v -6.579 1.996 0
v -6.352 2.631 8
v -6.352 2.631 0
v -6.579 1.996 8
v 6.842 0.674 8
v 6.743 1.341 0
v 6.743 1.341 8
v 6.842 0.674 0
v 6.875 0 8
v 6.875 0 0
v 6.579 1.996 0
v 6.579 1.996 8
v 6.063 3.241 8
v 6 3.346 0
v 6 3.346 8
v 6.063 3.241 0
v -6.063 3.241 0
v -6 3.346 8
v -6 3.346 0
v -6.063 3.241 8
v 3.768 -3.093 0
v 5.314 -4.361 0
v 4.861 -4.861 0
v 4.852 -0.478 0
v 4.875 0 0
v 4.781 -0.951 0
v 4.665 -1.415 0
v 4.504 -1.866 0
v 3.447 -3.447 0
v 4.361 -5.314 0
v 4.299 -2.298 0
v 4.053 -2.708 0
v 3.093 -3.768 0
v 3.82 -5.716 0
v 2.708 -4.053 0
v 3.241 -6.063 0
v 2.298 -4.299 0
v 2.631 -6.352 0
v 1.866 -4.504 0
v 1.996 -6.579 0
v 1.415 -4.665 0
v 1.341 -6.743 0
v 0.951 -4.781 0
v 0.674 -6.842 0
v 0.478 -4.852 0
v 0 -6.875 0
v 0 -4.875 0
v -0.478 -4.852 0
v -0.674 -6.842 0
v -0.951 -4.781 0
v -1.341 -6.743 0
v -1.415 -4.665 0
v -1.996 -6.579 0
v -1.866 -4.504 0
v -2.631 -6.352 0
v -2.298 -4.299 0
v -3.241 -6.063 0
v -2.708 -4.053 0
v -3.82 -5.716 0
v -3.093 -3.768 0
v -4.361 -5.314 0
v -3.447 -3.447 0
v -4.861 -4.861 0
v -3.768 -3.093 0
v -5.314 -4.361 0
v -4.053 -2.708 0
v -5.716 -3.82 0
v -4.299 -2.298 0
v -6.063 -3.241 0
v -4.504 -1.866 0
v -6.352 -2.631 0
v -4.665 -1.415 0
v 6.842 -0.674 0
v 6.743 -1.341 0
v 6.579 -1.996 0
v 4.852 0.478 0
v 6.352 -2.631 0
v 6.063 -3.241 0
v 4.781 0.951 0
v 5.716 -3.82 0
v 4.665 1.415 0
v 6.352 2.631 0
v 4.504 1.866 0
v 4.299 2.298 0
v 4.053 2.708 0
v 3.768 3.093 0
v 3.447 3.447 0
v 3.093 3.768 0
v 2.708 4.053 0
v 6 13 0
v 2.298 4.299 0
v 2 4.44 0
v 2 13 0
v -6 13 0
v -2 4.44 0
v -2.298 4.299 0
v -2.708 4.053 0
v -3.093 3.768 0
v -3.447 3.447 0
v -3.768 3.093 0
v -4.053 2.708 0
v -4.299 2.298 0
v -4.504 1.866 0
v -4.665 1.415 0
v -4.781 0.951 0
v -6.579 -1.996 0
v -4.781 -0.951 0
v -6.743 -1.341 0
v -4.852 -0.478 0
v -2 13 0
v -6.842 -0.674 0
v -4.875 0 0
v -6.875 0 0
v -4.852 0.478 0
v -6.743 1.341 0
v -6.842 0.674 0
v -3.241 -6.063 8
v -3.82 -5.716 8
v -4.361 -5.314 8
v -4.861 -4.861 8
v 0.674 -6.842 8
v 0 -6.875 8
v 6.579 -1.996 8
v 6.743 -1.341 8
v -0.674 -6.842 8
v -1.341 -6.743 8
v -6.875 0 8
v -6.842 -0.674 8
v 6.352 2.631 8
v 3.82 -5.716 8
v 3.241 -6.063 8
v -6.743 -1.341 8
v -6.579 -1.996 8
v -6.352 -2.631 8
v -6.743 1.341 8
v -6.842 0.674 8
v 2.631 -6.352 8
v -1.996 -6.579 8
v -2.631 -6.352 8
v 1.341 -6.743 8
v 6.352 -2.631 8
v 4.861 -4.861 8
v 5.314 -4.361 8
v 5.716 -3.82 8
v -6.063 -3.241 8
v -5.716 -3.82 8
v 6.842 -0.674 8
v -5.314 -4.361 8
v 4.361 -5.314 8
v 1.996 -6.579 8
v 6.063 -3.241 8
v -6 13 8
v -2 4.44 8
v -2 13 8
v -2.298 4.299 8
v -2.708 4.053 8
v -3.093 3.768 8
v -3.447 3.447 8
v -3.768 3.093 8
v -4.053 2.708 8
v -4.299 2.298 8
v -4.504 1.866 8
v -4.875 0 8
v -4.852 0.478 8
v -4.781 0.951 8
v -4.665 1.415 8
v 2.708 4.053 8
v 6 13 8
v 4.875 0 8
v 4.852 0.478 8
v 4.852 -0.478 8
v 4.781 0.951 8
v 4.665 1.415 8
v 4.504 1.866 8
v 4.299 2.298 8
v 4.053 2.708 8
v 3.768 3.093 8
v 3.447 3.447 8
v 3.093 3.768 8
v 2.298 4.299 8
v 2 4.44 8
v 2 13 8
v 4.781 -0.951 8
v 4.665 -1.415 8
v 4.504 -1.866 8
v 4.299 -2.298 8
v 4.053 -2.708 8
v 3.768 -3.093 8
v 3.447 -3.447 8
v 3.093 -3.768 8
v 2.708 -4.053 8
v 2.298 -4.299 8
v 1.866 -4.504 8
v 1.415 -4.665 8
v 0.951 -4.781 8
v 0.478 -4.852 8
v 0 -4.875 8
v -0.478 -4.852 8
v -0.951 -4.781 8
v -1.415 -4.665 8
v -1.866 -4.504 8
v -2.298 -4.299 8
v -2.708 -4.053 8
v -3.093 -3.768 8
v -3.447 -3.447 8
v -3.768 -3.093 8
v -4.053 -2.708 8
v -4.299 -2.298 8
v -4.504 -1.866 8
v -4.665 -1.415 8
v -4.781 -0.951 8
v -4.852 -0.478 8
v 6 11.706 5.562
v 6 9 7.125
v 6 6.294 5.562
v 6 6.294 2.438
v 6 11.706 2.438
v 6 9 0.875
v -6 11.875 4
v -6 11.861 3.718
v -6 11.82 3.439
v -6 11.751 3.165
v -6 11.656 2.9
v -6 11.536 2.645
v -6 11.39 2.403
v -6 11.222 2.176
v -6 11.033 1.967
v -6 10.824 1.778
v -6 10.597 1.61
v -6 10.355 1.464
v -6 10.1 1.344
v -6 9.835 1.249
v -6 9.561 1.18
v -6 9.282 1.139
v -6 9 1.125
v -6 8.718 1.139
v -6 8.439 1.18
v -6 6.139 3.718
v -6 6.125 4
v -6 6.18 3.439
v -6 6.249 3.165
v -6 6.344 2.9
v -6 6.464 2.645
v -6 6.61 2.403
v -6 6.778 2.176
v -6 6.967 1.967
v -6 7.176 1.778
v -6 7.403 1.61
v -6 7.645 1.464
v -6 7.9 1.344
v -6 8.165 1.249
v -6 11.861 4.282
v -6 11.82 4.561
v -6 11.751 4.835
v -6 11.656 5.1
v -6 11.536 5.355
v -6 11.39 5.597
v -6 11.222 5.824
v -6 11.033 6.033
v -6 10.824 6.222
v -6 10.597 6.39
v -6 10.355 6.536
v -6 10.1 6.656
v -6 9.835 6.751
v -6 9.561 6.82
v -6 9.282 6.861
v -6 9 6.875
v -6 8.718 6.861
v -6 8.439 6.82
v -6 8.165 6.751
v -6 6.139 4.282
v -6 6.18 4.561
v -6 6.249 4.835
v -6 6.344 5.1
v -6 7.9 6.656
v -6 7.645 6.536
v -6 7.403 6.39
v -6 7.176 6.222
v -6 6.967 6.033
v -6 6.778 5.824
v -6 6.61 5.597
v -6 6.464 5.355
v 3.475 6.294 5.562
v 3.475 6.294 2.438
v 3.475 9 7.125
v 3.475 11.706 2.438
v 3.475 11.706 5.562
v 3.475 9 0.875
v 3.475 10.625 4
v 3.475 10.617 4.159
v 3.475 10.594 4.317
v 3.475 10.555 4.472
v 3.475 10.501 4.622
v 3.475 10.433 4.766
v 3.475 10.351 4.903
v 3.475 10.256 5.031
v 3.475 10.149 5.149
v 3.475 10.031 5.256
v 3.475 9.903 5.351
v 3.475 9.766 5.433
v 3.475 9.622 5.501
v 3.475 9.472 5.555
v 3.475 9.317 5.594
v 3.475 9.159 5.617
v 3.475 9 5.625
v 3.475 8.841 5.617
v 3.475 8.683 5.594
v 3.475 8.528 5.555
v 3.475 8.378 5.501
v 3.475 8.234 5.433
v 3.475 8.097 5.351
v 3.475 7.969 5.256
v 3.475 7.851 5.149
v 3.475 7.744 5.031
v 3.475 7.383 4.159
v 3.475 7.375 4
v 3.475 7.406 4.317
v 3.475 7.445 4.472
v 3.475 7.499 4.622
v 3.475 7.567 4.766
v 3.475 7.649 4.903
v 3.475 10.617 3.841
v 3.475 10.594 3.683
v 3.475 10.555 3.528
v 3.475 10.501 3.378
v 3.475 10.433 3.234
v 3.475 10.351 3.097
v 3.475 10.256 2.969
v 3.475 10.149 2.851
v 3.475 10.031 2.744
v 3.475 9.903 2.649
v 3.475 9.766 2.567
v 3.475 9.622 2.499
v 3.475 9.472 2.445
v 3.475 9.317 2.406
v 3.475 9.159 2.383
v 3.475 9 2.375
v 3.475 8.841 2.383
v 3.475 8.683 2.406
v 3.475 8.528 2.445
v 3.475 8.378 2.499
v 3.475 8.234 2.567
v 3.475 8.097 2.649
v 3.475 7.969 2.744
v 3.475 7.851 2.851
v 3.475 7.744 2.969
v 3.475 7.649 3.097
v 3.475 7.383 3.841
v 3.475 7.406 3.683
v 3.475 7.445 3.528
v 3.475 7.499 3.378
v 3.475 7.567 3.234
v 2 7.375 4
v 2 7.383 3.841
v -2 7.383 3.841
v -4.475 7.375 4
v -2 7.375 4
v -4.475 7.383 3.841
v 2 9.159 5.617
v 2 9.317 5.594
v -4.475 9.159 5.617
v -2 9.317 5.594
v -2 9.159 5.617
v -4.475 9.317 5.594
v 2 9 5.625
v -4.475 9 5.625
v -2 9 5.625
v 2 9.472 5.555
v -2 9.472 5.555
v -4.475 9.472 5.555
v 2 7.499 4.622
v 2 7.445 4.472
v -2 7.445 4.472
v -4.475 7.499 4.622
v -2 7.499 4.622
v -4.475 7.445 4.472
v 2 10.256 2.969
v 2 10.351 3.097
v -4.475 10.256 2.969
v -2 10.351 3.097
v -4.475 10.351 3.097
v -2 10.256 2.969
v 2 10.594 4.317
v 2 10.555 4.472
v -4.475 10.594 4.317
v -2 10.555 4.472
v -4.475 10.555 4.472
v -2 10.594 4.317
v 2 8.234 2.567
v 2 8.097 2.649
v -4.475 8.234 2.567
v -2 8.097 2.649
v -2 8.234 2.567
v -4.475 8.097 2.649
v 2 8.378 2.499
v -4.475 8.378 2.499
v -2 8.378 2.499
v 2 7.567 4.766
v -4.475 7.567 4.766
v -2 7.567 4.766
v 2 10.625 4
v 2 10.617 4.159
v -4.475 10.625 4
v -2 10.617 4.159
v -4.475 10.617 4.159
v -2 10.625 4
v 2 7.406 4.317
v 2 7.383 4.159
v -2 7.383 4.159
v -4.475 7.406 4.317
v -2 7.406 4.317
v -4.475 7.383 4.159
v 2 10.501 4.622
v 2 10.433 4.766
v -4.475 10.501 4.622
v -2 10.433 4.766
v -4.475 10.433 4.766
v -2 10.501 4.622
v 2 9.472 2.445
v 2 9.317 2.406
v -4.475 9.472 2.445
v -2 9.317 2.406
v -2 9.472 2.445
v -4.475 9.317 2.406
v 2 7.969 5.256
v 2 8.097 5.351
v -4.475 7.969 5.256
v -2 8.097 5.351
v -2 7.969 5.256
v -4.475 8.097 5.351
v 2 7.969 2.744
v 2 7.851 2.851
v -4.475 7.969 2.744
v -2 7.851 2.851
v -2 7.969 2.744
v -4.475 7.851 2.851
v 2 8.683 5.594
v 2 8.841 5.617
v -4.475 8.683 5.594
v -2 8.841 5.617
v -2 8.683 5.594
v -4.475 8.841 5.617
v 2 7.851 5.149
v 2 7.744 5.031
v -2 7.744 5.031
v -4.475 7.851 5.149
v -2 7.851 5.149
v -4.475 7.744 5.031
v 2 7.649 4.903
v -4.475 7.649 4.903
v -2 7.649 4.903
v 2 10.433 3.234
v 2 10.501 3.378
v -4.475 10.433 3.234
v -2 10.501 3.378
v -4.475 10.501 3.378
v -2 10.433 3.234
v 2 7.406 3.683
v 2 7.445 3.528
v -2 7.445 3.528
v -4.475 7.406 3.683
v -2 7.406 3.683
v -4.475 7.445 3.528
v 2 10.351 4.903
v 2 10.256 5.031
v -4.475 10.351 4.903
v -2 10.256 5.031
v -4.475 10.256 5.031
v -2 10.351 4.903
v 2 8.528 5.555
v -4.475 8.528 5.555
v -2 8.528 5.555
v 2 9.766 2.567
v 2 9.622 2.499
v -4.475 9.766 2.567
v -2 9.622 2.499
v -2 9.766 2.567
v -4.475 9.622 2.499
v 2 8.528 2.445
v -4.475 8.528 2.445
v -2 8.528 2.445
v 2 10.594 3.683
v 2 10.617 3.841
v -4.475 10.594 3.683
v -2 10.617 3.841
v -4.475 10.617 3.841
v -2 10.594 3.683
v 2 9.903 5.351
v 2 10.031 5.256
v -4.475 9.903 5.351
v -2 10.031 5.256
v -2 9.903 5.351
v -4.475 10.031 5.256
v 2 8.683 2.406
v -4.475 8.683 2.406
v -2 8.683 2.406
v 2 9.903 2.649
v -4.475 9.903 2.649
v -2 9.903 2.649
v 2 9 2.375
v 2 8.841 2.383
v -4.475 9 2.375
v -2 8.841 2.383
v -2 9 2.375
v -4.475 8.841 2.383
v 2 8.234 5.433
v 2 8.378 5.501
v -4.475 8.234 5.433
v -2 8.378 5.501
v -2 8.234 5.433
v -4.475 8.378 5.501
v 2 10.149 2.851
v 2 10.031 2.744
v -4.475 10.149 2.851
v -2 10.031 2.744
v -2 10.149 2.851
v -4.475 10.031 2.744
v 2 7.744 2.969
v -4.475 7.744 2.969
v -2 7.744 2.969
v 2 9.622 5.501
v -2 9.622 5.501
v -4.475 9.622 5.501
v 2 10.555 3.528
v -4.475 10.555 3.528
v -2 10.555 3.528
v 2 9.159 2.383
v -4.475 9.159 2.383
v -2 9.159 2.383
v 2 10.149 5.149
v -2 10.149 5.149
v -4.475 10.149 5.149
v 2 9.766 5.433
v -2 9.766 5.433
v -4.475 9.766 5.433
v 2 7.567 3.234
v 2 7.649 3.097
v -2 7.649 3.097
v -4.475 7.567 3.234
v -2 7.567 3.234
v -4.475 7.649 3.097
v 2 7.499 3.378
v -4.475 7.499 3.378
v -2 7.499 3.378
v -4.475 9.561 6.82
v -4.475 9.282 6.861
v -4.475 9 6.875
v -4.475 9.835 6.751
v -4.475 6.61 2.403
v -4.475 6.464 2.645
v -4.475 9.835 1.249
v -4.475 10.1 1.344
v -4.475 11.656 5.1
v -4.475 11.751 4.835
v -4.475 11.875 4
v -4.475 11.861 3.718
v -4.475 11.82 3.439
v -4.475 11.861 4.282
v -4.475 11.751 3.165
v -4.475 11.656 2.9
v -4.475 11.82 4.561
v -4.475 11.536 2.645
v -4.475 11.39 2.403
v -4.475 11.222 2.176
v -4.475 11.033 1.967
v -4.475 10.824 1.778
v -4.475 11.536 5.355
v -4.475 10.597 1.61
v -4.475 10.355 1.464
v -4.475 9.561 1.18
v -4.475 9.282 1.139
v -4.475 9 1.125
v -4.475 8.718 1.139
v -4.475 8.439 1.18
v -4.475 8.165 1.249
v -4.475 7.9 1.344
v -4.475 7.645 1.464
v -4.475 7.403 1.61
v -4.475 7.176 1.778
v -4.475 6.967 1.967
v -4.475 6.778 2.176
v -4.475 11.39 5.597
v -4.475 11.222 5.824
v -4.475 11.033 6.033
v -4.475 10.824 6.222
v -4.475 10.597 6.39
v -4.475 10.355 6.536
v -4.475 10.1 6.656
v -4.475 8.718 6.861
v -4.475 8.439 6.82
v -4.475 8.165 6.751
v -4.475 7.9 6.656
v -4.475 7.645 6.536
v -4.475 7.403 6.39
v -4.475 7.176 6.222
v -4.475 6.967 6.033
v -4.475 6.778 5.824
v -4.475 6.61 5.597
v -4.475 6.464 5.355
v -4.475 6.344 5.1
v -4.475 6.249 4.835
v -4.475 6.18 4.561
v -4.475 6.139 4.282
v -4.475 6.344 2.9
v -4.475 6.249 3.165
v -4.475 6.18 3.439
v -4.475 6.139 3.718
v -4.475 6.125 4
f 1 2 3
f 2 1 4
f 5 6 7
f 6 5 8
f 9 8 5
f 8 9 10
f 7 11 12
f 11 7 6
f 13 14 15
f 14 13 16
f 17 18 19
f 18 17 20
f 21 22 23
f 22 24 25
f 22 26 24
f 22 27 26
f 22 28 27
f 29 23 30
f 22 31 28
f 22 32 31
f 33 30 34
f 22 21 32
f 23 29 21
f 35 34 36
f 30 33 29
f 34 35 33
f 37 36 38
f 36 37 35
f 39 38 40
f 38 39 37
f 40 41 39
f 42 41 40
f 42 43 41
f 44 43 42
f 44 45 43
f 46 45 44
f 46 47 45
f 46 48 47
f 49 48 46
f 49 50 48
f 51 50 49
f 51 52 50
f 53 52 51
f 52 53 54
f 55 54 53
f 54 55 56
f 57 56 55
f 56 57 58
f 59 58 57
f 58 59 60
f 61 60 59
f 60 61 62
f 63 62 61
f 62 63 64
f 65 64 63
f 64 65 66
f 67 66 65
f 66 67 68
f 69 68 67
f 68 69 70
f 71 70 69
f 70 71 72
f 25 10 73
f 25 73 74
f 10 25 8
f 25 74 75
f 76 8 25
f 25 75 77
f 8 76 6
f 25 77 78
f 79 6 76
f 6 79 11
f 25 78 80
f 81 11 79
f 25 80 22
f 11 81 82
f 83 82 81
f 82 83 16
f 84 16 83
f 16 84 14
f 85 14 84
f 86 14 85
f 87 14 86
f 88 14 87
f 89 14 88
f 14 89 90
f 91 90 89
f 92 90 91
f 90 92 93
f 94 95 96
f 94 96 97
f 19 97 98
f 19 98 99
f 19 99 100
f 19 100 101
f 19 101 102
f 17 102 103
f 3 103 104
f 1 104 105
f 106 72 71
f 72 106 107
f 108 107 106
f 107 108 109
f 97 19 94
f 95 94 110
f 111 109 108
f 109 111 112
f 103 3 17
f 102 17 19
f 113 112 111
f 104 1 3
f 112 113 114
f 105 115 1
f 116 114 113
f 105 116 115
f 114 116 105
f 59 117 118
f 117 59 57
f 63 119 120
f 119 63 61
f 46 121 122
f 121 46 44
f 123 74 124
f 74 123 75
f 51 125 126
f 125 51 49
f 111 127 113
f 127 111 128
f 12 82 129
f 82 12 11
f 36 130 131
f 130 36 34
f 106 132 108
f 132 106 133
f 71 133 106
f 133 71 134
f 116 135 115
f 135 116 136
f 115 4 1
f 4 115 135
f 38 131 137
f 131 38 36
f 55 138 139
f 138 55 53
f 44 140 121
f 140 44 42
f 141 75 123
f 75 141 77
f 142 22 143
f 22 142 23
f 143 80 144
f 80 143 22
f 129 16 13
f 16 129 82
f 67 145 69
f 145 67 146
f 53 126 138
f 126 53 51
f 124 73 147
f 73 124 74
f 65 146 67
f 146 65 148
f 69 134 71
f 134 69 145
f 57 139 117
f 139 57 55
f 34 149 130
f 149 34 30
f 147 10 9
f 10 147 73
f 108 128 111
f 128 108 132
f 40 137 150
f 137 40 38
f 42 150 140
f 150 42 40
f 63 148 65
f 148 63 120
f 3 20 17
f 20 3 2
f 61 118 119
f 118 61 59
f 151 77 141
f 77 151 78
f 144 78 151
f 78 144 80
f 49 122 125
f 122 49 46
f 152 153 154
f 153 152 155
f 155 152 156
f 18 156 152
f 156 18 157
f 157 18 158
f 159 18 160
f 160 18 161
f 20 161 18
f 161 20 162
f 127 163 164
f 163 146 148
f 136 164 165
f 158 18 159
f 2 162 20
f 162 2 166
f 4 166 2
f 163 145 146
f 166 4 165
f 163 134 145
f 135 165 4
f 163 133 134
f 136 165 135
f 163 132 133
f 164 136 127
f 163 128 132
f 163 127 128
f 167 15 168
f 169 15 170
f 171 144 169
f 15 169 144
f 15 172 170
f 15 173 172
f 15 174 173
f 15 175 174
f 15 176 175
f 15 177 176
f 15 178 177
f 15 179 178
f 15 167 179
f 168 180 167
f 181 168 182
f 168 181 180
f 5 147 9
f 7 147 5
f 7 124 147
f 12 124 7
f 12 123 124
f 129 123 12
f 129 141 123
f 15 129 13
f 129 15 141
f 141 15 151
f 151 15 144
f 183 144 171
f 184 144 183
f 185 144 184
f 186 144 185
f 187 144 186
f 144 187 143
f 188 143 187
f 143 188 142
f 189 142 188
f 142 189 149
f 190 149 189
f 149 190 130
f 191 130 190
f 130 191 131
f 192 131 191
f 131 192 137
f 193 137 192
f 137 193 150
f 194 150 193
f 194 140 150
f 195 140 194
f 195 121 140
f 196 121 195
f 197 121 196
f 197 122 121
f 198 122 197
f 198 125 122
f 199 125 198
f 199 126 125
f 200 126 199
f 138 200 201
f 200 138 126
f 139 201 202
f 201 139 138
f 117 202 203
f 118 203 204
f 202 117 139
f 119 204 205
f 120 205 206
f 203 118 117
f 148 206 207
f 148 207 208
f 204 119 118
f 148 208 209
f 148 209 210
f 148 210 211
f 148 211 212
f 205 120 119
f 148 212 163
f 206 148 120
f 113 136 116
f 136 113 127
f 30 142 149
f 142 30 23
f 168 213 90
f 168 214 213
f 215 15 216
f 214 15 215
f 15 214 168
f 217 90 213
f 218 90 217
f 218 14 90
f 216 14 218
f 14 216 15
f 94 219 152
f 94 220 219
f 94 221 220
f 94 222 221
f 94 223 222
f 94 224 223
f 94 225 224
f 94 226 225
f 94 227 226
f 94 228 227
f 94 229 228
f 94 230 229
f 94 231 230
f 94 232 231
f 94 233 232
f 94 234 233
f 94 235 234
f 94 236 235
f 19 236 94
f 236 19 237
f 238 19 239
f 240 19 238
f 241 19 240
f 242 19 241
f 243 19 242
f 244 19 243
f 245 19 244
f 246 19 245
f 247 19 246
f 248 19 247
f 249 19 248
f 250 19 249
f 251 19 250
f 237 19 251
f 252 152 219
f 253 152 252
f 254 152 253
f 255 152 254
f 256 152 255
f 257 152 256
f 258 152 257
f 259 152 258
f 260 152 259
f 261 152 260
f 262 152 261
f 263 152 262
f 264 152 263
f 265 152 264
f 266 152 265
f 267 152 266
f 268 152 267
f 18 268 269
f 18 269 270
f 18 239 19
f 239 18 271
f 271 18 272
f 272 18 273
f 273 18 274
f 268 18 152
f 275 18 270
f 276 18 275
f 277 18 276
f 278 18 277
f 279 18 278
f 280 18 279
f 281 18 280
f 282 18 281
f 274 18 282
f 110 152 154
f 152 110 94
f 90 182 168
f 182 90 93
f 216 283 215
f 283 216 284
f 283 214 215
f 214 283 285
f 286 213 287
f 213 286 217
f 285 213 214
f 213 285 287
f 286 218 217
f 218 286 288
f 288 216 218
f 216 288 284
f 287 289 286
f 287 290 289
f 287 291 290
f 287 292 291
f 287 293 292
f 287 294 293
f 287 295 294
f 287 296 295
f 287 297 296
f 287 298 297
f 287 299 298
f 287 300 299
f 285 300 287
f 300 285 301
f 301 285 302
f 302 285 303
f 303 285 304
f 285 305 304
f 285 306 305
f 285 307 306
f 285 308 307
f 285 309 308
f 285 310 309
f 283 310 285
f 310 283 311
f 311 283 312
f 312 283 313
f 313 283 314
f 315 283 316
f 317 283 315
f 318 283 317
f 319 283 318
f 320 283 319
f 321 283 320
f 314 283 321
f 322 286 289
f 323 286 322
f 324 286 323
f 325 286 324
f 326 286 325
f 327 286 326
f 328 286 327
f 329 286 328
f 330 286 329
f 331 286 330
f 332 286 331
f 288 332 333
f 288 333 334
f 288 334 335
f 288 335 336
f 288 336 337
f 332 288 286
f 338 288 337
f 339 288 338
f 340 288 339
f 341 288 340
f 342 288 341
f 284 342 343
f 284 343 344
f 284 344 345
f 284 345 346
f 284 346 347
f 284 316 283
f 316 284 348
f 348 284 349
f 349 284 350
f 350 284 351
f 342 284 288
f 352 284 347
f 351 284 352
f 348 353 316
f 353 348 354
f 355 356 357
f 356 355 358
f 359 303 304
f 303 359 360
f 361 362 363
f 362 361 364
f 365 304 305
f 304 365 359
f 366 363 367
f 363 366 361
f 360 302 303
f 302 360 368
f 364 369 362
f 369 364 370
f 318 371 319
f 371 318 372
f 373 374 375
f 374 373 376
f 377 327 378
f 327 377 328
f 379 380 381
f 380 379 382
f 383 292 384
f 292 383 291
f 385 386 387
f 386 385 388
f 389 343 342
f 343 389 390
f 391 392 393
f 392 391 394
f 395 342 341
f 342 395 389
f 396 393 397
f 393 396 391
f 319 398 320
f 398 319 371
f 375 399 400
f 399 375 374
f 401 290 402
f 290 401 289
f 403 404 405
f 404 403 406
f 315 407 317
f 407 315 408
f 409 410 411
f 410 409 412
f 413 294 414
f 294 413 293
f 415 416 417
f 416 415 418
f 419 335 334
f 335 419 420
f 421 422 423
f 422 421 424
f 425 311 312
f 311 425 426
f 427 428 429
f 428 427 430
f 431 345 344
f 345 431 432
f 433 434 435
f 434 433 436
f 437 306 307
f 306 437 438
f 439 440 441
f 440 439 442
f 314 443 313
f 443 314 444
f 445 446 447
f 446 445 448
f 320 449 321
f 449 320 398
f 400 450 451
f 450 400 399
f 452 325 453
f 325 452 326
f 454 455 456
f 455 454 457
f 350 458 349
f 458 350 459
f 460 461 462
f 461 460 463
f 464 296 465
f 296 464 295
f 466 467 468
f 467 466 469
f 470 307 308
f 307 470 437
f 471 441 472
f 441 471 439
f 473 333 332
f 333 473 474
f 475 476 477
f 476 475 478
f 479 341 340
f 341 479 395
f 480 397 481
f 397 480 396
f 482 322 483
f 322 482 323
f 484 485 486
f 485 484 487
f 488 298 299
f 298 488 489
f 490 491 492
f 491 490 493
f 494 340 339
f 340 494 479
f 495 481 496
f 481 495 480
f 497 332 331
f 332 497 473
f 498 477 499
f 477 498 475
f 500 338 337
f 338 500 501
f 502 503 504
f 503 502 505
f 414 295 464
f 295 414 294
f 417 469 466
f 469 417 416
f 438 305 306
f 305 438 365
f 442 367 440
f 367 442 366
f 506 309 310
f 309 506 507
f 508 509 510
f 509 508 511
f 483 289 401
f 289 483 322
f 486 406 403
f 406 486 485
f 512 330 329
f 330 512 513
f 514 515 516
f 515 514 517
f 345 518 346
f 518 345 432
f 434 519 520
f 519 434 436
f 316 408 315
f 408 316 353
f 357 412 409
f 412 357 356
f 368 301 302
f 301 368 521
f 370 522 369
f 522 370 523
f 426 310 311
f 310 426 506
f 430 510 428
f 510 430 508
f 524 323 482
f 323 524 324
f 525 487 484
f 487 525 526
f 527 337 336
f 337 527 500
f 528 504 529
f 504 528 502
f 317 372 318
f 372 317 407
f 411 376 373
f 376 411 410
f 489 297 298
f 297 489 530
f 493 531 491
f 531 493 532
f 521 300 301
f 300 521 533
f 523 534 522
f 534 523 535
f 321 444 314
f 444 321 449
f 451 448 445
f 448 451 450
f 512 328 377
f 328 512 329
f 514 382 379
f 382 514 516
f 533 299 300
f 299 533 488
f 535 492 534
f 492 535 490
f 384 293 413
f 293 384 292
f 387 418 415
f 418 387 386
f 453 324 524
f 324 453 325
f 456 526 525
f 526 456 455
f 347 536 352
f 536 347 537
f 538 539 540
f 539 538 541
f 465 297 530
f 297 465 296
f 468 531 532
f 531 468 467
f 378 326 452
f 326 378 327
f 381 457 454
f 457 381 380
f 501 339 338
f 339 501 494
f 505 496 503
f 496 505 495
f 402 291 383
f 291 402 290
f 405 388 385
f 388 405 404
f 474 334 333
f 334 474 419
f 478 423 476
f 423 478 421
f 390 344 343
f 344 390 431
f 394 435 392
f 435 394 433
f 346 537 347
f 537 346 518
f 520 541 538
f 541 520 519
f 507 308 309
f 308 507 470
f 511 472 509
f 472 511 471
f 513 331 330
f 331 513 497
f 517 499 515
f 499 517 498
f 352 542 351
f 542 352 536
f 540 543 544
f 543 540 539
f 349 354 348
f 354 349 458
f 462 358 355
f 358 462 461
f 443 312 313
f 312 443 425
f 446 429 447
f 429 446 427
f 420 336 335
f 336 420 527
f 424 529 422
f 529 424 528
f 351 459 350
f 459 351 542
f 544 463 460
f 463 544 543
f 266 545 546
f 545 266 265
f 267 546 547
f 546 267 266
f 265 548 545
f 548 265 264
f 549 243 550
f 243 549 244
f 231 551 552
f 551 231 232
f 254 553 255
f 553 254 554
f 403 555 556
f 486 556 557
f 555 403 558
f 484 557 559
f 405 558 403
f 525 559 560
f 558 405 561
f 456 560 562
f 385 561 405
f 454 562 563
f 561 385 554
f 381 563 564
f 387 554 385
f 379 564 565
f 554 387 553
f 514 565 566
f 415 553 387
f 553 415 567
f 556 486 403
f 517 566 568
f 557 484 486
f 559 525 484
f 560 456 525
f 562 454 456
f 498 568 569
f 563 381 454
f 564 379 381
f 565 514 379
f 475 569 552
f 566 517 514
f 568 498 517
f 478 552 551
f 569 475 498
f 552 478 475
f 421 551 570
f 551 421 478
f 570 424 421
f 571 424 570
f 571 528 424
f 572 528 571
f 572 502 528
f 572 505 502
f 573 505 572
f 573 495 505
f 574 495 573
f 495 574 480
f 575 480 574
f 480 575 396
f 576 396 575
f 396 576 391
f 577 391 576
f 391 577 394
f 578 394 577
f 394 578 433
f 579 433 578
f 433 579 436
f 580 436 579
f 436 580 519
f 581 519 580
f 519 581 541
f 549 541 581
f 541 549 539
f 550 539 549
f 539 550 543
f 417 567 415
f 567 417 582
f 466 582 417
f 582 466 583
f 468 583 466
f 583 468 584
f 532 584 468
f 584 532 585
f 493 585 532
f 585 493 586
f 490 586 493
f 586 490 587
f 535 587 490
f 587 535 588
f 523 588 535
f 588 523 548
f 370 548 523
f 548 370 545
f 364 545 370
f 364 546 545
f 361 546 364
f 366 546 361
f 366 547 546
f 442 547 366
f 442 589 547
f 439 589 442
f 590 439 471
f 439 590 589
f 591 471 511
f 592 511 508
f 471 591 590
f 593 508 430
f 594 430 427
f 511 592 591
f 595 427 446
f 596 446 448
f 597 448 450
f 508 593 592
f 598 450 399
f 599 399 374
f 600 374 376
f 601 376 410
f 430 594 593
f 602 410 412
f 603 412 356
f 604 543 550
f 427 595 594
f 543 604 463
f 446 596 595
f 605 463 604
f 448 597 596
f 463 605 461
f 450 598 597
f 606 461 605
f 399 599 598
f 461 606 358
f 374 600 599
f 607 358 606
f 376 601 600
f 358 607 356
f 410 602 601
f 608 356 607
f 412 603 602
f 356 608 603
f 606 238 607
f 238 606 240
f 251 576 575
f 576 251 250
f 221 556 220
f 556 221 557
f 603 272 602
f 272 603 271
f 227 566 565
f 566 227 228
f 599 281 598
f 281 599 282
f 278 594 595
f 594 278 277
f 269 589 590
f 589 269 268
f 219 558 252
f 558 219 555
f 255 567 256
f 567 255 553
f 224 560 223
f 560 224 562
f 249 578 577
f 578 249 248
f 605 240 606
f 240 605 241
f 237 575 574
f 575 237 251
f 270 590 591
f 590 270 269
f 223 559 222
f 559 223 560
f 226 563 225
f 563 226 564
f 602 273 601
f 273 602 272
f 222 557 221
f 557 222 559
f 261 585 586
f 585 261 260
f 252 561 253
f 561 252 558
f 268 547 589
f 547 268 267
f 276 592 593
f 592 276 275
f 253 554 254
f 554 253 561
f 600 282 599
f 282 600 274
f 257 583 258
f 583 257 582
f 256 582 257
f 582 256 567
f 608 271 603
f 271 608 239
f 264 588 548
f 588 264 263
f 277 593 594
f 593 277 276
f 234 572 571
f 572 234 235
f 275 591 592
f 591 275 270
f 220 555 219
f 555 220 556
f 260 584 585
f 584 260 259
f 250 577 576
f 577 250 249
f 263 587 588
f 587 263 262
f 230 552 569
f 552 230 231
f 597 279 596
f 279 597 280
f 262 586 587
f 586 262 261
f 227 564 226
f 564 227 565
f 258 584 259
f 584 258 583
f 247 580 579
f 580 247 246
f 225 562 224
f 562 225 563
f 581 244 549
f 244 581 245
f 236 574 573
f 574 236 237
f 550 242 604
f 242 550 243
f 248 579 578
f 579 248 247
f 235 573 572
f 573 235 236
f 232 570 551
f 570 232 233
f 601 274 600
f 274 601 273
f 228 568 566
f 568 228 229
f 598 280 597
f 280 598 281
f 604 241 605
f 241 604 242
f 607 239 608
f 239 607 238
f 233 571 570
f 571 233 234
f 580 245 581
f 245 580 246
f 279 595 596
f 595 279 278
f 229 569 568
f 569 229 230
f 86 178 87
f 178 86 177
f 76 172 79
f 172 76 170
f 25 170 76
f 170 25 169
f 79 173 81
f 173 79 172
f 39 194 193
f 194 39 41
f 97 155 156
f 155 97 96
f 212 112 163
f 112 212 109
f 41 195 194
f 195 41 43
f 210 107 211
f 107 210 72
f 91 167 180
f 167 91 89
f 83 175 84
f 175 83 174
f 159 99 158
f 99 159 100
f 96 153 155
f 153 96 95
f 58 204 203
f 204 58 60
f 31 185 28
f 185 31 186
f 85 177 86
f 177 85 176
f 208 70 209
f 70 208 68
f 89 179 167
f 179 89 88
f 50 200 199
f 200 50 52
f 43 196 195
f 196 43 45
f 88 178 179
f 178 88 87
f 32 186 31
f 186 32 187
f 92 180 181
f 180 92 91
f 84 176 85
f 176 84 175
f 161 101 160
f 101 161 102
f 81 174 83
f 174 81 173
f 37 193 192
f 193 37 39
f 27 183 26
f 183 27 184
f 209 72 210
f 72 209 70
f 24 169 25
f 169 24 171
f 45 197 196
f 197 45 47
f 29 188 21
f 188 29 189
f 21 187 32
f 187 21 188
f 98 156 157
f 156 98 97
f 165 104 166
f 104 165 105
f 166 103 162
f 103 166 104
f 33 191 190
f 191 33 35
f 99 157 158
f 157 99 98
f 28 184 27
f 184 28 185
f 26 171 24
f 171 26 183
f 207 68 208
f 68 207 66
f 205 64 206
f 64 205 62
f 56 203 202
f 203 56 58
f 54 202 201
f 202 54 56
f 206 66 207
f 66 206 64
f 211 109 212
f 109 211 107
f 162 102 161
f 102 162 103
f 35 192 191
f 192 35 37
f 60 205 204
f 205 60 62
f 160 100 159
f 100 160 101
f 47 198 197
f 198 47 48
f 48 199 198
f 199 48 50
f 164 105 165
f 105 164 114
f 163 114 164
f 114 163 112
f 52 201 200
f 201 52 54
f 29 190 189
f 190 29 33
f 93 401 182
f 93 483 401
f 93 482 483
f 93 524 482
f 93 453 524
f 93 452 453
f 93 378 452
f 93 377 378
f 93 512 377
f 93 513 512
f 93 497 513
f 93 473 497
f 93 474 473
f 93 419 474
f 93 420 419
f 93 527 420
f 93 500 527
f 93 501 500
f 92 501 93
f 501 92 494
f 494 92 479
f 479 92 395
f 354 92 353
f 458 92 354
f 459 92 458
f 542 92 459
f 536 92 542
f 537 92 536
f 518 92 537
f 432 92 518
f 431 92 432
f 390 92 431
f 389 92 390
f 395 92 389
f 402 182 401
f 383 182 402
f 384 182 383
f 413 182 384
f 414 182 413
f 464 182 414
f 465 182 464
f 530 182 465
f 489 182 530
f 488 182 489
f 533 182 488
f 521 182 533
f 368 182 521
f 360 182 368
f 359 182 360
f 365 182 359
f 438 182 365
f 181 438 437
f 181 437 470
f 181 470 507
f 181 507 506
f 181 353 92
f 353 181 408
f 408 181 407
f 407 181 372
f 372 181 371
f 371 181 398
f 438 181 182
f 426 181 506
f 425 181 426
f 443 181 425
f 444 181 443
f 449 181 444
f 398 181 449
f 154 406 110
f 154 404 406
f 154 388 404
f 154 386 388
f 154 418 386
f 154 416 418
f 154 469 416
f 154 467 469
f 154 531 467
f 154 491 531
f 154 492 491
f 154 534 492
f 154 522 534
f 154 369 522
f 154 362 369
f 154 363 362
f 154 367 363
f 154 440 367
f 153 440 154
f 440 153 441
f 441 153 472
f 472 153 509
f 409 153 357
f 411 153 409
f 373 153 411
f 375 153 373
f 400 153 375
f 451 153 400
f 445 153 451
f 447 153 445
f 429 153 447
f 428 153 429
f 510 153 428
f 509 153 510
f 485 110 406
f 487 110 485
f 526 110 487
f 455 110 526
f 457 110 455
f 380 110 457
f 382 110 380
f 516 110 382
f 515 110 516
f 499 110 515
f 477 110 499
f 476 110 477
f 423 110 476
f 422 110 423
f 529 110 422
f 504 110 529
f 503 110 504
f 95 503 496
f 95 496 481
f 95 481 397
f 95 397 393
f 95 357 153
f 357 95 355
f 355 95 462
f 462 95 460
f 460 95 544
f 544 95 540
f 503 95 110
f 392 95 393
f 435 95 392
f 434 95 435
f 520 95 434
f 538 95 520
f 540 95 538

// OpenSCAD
$fn = 64;

id = 9.75;
h=8;
wall = 4;

difference() {
  union() {
    cylinder(d=id+wall, h=h);
    translate([-wall*1.5,id/3,0]) cube([wall*3,id,h]);
  }
  translate([0,0,-0.1]) cylinder(d=id, h=h+0.2);
  translate([-wall/2,0,-0.1]) cube([wall,id*2, id*2]);
  
  translate([wall*1.5-1.25,wall*3-3,h/2]) rotate([0,-90,0]) {
    cylinder(d=6.25, h=2.55, center=true, $fn=6);
    cylinder(d=3.25,h=2*h);
    translate([0,0,wall*3-1.5]) cylinder(d=5.75, h=2.55, center=true);
 }
}
